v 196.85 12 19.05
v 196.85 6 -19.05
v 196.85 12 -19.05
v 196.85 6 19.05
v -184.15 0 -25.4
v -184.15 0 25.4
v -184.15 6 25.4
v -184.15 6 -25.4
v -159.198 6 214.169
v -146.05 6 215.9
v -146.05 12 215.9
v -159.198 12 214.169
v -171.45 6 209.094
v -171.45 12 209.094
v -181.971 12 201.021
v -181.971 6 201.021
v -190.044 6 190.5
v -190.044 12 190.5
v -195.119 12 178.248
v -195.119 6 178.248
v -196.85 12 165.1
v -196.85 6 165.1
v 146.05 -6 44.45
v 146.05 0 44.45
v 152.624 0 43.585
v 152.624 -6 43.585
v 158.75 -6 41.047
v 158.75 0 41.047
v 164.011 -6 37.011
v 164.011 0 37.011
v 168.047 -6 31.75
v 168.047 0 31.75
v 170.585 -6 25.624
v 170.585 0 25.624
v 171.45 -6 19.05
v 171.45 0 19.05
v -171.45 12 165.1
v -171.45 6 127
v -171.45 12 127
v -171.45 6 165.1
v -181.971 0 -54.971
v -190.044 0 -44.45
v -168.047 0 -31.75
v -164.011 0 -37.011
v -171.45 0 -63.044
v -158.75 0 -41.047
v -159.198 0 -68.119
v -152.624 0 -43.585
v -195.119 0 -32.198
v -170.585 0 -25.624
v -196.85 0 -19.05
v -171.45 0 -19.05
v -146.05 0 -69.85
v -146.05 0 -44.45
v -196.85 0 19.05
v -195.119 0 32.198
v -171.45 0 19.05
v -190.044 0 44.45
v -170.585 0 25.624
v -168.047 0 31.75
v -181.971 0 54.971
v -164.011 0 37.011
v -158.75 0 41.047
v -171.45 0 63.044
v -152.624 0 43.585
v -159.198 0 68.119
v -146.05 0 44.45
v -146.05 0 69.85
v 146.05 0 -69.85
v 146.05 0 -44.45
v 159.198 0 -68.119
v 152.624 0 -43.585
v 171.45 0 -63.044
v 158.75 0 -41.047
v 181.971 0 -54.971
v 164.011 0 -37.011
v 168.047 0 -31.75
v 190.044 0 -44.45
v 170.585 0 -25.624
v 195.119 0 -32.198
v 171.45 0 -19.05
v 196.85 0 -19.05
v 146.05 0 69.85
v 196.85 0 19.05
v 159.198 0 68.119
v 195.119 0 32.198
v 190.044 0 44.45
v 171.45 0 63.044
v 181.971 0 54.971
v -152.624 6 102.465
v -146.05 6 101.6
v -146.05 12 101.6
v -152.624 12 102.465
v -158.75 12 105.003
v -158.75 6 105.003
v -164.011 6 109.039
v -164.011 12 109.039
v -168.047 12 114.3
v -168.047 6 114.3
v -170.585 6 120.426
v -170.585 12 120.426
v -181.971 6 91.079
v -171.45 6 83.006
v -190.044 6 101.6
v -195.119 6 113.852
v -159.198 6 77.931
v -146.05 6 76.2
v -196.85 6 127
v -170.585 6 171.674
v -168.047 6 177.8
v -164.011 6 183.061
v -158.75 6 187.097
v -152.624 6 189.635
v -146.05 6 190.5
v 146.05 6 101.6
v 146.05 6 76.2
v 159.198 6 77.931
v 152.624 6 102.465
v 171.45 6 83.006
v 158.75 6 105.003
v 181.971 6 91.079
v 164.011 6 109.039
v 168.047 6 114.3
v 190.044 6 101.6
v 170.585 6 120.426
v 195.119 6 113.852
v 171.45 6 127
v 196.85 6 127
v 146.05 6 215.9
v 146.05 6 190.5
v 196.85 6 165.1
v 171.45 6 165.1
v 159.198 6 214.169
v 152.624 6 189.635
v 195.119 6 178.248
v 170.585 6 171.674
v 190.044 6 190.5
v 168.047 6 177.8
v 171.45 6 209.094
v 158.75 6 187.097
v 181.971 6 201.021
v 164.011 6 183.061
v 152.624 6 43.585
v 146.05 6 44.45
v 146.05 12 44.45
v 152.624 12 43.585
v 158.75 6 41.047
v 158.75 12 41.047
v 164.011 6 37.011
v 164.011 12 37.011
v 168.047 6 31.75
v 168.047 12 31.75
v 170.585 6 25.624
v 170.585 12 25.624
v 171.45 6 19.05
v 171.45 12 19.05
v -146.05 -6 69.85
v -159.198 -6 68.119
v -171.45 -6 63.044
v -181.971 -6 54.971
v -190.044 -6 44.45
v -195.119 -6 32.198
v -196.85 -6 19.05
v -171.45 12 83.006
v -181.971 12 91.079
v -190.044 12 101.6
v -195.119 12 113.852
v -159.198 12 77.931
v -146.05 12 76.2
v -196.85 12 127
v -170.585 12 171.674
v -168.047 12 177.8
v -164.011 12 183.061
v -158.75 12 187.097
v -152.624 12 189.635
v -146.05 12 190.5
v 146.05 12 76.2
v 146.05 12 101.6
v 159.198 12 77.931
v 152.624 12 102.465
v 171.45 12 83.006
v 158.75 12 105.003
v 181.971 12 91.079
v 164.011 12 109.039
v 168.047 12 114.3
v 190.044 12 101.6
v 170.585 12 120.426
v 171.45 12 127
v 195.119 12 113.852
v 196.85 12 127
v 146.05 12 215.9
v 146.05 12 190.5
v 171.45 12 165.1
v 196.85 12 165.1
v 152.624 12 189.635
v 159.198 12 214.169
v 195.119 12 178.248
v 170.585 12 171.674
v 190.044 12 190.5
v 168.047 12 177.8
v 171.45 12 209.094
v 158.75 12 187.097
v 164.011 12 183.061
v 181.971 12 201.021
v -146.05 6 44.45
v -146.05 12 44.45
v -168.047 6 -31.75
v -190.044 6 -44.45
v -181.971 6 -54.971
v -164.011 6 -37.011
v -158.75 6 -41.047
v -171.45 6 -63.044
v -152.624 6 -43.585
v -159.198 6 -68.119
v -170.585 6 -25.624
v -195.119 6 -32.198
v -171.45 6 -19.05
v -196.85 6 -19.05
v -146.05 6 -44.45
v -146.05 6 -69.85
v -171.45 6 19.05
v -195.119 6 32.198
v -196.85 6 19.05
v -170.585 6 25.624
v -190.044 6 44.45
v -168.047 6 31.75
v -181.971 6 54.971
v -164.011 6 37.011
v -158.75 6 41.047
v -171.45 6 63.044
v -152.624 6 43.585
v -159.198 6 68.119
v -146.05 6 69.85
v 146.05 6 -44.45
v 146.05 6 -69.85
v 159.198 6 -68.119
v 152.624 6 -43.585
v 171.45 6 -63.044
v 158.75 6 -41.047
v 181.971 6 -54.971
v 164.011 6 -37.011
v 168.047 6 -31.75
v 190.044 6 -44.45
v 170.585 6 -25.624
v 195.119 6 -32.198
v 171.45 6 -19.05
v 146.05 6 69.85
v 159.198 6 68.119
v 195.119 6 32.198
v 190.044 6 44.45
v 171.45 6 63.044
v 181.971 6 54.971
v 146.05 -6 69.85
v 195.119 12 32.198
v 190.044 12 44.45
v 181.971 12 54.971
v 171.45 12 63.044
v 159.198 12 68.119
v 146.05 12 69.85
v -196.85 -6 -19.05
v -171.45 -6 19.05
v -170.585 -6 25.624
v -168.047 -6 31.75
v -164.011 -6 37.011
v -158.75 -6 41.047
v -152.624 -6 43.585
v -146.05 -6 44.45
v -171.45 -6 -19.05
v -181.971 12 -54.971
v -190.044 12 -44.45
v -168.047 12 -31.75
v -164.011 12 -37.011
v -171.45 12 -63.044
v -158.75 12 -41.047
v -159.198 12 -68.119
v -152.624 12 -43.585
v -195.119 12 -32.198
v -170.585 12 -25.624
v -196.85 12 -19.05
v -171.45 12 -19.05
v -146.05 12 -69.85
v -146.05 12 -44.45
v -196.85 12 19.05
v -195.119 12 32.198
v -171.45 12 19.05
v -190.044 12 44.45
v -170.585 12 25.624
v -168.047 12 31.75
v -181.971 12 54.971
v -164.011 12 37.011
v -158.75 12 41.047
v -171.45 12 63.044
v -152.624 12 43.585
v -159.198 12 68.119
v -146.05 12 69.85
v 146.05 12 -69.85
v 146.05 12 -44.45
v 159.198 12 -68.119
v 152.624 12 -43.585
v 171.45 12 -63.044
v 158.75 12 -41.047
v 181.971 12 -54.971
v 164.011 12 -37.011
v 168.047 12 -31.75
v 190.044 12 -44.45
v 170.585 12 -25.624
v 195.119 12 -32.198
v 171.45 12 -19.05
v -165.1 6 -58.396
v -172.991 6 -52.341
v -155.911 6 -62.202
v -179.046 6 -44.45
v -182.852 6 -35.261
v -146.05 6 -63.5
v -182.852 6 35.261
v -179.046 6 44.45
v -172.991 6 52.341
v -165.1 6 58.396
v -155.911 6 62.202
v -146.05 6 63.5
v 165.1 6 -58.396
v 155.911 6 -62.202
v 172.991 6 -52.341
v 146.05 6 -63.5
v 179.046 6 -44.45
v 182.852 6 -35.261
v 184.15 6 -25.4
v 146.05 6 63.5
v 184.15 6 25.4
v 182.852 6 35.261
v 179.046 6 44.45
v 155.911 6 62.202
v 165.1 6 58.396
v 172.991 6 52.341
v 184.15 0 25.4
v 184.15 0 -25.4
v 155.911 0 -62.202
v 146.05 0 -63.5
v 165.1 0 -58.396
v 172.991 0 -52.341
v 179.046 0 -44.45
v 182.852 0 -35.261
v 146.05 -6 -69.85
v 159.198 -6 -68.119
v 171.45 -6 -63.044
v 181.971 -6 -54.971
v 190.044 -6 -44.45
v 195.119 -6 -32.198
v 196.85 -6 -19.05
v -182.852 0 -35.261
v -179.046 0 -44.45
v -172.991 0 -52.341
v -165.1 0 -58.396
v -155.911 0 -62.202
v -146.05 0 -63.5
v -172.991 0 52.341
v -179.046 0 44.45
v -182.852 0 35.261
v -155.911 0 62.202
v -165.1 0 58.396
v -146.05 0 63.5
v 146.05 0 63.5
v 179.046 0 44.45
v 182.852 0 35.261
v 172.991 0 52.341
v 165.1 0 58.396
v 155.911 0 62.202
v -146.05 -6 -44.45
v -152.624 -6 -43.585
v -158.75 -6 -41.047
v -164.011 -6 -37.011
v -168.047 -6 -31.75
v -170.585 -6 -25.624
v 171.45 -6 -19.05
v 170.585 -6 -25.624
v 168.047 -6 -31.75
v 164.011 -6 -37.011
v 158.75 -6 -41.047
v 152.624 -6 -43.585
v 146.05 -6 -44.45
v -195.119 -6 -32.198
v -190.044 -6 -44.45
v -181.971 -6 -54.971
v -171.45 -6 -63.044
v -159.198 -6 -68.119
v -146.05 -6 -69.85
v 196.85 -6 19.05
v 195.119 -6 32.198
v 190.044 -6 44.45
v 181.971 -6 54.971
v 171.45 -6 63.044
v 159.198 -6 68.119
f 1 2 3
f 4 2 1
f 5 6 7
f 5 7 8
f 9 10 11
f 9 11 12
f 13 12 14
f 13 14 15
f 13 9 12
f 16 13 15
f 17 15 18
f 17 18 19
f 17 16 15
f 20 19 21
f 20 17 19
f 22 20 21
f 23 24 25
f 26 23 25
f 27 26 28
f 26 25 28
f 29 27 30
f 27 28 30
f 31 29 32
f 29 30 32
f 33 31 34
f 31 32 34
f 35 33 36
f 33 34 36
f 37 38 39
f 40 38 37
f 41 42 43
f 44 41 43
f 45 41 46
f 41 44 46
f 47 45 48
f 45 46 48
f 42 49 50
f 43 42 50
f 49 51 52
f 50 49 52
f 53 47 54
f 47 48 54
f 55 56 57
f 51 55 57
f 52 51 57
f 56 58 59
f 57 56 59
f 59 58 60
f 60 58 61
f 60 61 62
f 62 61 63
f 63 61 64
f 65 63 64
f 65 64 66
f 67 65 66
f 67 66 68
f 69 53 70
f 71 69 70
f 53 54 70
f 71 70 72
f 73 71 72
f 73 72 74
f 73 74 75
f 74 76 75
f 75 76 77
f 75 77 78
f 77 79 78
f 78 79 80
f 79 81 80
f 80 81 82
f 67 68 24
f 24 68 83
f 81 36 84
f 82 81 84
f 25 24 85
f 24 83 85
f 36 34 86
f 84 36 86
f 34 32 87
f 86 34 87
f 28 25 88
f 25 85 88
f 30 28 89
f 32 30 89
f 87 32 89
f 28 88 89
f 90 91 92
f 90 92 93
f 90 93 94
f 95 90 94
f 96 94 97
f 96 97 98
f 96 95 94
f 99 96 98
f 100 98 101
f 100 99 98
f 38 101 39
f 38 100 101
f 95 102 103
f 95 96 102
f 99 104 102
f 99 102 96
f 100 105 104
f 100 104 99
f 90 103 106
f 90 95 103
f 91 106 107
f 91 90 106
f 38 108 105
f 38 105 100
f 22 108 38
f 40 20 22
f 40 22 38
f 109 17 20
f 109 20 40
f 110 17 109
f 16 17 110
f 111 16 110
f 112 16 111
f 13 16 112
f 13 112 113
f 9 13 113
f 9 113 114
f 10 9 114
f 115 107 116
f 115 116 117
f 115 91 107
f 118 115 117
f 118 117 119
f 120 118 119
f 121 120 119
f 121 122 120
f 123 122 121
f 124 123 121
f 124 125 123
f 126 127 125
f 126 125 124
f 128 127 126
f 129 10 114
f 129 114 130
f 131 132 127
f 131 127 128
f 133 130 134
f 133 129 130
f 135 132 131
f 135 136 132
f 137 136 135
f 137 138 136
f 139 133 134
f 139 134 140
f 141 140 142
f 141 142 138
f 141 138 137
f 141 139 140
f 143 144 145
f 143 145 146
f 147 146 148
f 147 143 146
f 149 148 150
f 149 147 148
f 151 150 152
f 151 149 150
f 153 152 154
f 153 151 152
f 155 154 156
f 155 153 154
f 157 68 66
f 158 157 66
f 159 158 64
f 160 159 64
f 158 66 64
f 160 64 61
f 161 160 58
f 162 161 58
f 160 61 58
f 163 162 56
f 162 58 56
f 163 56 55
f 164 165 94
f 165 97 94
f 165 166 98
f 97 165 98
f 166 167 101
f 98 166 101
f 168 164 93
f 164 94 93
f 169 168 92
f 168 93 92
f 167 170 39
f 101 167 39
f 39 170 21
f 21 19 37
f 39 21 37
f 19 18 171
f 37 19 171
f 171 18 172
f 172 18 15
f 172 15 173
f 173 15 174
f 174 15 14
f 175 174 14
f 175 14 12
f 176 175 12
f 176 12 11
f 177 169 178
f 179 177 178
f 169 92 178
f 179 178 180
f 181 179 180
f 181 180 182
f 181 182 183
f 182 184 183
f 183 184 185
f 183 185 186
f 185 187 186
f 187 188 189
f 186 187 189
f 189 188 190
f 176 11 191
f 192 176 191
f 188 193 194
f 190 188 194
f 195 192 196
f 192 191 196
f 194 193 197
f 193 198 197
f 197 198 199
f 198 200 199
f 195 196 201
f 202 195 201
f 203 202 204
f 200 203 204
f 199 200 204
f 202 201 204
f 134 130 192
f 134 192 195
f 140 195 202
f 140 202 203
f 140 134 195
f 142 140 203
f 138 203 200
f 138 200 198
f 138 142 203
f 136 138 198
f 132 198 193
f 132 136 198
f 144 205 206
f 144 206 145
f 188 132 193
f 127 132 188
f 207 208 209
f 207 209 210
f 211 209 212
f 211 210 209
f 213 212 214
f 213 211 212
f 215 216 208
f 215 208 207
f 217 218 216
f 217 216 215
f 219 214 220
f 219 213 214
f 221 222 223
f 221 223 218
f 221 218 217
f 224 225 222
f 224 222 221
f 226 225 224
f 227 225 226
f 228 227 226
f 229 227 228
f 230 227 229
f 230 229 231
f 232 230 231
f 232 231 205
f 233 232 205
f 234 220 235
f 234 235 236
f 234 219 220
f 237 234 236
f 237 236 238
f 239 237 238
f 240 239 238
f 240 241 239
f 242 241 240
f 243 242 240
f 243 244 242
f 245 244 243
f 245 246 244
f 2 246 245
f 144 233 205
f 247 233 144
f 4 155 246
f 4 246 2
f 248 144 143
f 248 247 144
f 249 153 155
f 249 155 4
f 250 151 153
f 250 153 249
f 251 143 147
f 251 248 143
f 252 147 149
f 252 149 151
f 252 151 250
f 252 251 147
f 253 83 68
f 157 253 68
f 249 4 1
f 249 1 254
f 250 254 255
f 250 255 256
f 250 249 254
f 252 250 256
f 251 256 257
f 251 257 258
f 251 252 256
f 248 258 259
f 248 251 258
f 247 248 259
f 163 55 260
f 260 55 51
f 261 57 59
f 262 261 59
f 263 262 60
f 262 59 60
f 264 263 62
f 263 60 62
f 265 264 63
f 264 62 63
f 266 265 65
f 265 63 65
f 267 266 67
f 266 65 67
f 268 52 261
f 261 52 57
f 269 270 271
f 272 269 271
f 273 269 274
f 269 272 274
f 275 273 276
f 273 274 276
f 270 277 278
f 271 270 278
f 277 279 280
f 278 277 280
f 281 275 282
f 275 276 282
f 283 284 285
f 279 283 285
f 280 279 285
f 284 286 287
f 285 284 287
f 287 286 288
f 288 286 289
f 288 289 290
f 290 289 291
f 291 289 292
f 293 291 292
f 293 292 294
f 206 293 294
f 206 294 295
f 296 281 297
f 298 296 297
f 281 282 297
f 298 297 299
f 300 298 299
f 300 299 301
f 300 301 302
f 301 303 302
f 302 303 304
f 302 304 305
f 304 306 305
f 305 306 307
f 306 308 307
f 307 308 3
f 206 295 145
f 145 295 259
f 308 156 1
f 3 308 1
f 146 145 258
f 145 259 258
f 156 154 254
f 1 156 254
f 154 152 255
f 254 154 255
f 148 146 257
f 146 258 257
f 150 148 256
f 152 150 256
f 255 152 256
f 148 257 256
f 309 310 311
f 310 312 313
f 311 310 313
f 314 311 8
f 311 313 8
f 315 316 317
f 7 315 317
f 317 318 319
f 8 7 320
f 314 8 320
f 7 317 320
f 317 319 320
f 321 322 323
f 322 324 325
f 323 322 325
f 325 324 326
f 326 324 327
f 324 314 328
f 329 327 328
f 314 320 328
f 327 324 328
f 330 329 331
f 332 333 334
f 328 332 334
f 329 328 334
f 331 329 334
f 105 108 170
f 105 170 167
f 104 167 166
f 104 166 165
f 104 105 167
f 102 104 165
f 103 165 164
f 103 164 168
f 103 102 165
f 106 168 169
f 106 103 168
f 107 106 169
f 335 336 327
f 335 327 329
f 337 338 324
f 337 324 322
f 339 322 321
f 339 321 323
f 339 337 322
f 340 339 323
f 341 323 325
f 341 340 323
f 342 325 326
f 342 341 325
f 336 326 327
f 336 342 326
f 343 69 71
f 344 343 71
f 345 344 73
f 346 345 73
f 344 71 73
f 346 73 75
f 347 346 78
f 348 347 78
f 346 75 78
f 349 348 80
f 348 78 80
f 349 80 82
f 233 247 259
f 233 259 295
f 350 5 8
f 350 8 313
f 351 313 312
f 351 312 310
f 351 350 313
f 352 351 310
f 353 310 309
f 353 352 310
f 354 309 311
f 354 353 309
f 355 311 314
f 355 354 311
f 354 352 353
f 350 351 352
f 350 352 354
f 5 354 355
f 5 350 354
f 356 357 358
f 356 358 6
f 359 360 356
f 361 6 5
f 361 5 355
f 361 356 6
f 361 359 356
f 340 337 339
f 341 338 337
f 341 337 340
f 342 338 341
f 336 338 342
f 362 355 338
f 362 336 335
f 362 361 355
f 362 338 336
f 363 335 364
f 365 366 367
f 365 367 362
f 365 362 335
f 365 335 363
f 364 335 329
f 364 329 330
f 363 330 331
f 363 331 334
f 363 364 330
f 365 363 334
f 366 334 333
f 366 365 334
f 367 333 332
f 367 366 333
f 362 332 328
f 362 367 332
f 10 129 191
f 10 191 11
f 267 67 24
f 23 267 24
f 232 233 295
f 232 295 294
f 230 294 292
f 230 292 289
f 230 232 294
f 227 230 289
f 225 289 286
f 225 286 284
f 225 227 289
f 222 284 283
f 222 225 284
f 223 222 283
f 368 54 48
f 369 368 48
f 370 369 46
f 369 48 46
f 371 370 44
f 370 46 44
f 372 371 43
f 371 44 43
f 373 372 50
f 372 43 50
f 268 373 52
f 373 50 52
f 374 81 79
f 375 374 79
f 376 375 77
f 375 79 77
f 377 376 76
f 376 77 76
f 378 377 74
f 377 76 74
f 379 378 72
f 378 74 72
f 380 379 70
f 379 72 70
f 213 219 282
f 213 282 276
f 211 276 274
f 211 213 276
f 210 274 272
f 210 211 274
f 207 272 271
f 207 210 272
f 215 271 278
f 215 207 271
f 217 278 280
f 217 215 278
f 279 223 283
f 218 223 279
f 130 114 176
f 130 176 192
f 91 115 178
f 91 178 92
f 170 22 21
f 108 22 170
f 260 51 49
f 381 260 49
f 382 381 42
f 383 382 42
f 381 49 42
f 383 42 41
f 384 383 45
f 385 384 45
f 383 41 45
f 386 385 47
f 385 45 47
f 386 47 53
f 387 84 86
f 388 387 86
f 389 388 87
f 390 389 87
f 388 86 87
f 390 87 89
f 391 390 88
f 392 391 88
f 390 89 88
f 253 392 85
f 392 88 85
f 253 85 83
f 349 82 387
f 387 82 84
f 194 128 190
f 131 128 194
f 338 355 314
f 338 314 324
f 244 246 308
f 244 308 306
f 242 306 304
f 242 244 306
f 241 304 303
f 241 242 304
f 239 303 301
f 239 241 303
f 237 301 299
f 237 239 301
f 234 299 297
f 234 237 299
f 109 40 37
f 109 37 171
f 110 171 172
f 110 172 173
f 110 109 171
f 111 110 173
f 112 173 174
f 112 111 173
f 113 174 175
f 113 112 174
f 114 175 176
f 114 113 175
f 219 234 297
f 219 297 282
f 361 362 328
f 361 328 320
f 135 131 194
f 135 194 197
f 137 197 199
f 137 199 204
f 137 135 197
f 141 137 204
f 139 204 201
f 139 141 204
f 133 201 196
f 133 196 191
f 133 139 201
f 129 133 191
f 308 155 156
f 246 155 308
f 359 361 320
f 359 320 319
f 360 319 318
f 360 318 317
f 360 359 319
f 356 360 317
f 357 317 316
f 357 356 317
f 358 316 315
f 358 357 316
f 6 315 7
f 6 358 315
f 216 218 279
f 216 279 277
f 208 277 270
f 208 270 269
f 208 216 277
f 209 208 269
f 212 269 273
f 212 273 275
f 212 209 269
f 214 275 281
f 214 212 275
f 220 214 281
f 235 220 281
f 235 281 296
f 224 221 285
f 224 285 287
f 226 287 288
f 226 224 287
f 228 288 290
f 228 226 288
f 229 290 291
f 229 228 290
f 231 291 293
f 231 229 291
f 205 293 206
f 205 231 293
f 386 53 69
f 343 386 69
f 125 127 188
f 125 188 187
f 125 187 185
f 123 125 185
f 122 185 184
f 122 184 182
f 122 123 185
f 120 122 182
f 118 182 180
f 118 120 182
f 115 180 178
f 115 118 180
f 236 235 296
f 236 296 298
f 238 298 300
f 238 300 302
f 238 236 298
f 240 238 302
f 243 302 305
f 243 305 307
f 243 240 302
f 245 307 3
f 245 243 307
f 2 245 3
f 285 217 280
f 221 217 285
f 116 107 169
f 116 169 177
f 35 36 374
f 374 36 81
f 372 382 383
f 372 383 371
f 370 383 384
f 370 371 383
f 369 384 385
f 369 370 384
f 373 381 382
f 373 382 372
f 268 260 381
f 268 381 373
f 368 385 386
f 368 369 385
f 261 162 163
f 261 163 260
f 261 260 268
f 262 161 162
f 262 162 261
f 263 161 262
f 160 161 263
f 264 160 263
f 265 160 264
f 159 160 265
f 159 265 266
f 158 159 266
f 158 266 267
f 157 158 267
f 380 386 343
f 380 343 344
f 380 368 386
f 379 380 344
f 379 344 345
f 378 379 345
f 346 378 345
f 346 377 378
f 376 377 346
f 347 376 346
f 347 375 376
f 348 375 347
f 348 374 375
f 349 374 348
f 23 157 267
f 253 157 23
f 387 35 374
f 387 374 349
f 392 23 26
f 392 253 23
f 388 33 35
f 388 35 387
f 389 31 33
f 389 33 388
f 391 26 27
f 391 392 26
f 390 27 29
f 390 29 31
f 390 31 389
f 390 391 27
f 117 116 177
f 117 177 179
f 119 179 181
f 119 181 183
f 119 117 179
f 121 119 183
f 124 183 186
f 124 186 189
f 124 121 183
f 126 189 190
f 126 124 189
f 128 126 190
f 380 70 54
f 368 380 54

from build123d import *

# Parameters (mm, degrees)
F1_DEPTH = 6
F3_DEPTH = 6
F4_START = -6
F4_DEPTH = 6


with BuildPart() as f1:
    # F0 (on Front) → F1 (new body)
    with BuildSketch(Plane.XZ):
        with BuildLine():
            ThreePointArc((184.15, 25.4), (172.9907683632, 52.3407683632), (146.05, 63.5))
            Line((146.05, 63.5), (-146.05, 63.5))
            ThreePointArc((-146.05, 63.5), (-172.9907683632, 52.3407683632), (-184.15, 25.4))
            Line((-184.15, 25.4), (-184.15, -25.4))
            ThreePointArc((-184.15, -25.4), (-172.9907683632, -52.3407683632), (-146.05, -63.5))
            Line((-146.05, -63.5), (146.05, -63.5))
            ThreePointArc((146.05, -63.5), (172.9907683632, -52.3407683632), (184.15, -25.4))
            Line((184.15, -25.4), (184.15, 25.4))
        make_face()
    extrude(amount=-F1_DEPTH)


with BuildPart() as f3:
    # F2 (on Front) → F3 (new body)
    with BuildSketch(Plane.XZ):
        with BuildLine():
            ThreePointArc((196.85, 19.05), (181.9710244843, 54.9710244843), (146.05, 69.85))
            Line((146.05, 69.85), (-146.05, 69.85))
            ThreePointArc((-146.05, 69.85), (-181.9710244843, 54.9710244843), (-196.85, 19.05))
            Line((-196.85, 19.05), (-196.85, -19.05))
            ThreePointArc((-196.85, -19.05), (-181.9710244843, -54.9710244843), (-146.05, -69.85))
            Line((-146.05, -69.85), (146.05, -69.85))
            ThreePointArc((146.05, -69.85), (181.9710244843, -54.9710244843), (196.85, -19.05))
            Line((196.85, -19.05), (196.85, 19.05))
        make_face()
        with BuildLine():
            Line((-146.05, 44.45), (146.05, 44.45))
            ThreePointArc((146.05, 44.45), (164.0105122421, 37.0105122421), (171.45, 19.05))
            Line((171.45, 19.05), (171.45, -19.05))
            ThreePointArc((171.45, -19.05), (164.0105122421, -37.0105122421), (146.05, -44.45))
            Line((146.05, -44.45), (-146.05, -44.45))
            ThreePointArc((-146.05, -44.45), (-164.0105122421, -37.0105122421), (-171.45, -19.05))
            Line((-171.45, -19.05), (-171.45, 19.05))
            ThreePointArc((-171.45, 19.05), (-164.0105122421, 37.0105122421), (-146.05, 44.45))
        make_face(mode=Mode.SUBTRACT)
    extrude(amount=F3_DEPTH)


with BuildPart() as f4:
    # F2 (on Front) → F4 (new body)
    with BuildSketch(Plane.XZ.offset(F4_START)):
        with BuildLine():
            ThreePointArc((196.85, 19.05), (181.9710244843, 54.9710244843), (146.05, 69.85))
            Line((146.05, 69.85), (-146.05, 69.85))
            ThreePointArc((-146.05, 69.85), (-181.9710244843, 54.9710244843), (-196.85, 19.05))
            Line((-196.85, 19.05), (-196.85, -19.05))
            ThreePointArc((-196.85, -19.05), (-181.9710244843, -54.9710244843), (-146.05, -69.85))
            Line((-146.05, -69.85), (146.05, -69.85))
            ThreePointArc((146.05, -69.85), (181.9710244843, -54.9710244843), (196.85, -19.05))
            Line((196.85, -19.05), (196.85, 19.05))
        make_face()
        with BuildLine():
            Line((-146.05, 44.45), (146.05, 44.45))
            ThreePointArc((146.05, 44.45), (164.0105122421, 37.0105122421), (171.45, 19.05))
            Line((171.45, 19.05), (171.45, -19.05))
            ThreePointArc((171.45, -19.05), (164.0105122421, -37.0105122421), (146.05, -44.45))
            Line((146.05, -44.45), (-146.05, -44.45))
            ThreePointArc((-146.05, -44.45), (-164.0105122421, -37.0105122421), (-171.45, -19.05))
            Line((-171.45, -19.05), (-171.45, 19.05))
            ThreePointArc((-171.45, 19.05), (-164.0105122421, 37.0105122421), (-146.05, 44.45))
        make_face(mode=Mode.SUBTRACT)
    extrude(amount=-F4_DEPTH)


with BuildPart() as f4b:
    # F2 (on Front) → F4, piece 2 (new body)
    with BuildSketch(Plane.XZ.offset(F4_START)):
        with BuildLine():
            ThreePointArc((196.85, 165.1), (181.9710244843, 201.0210244843), (146.05, 215.9))
            Line((146.05, 215.9), (-146.05, 215.9))
            ThreePointArc((-146.05, 215.9), (-181.9710244843, 201.0210244843), (-196.85, 165.1))
            Line((-196.85, 165.1), (-196.85, 127))
            ThreePointArc((-196.85, 127), (-181.9710244843, 91.0789755157), (-146.05, 76.2))
            Line((-146.05, 76.2), (146.05, 76.2))
            ThreePointArc((146.05, 76.2), (181.9710244843, 91.0789755157), (196.85, 127))
            Line((196.85, 127), (196.85, 165.1))
        make_face()
        with BuildLine():
            ThreePointArc((171.45, 127), (164.0105122421, 109.0394877579), (146.05, 101.6))
            Line((146.05, 101.6), (-146.05, 101.6))
            ThreePointArc((-146.05, 101.6), (-164.0105122421, 109.0394877579), (-171.45, 127))
            Line((-171.45, 127), (-171.45, 165.1))
            ThreePointArc((-171.45, 165.1), (-164.0105122421, 183.0605122421), (-146.05, 190.5))
            Line((-146.05, 190.5), (146.05, 190.5))
            ThreePointArc((146.05, 190.5), (164.0105122421, 183.0605122421), (171.45, 165.1))
            Line((171.45, 165.1), (171.45, 127))
        make_face(mode=Mode.SUBTRACT)
    extrude(amount=-F4_DEPTH)


solid = Compound([f1.part, f3.part, f4.part, f4b.part])
